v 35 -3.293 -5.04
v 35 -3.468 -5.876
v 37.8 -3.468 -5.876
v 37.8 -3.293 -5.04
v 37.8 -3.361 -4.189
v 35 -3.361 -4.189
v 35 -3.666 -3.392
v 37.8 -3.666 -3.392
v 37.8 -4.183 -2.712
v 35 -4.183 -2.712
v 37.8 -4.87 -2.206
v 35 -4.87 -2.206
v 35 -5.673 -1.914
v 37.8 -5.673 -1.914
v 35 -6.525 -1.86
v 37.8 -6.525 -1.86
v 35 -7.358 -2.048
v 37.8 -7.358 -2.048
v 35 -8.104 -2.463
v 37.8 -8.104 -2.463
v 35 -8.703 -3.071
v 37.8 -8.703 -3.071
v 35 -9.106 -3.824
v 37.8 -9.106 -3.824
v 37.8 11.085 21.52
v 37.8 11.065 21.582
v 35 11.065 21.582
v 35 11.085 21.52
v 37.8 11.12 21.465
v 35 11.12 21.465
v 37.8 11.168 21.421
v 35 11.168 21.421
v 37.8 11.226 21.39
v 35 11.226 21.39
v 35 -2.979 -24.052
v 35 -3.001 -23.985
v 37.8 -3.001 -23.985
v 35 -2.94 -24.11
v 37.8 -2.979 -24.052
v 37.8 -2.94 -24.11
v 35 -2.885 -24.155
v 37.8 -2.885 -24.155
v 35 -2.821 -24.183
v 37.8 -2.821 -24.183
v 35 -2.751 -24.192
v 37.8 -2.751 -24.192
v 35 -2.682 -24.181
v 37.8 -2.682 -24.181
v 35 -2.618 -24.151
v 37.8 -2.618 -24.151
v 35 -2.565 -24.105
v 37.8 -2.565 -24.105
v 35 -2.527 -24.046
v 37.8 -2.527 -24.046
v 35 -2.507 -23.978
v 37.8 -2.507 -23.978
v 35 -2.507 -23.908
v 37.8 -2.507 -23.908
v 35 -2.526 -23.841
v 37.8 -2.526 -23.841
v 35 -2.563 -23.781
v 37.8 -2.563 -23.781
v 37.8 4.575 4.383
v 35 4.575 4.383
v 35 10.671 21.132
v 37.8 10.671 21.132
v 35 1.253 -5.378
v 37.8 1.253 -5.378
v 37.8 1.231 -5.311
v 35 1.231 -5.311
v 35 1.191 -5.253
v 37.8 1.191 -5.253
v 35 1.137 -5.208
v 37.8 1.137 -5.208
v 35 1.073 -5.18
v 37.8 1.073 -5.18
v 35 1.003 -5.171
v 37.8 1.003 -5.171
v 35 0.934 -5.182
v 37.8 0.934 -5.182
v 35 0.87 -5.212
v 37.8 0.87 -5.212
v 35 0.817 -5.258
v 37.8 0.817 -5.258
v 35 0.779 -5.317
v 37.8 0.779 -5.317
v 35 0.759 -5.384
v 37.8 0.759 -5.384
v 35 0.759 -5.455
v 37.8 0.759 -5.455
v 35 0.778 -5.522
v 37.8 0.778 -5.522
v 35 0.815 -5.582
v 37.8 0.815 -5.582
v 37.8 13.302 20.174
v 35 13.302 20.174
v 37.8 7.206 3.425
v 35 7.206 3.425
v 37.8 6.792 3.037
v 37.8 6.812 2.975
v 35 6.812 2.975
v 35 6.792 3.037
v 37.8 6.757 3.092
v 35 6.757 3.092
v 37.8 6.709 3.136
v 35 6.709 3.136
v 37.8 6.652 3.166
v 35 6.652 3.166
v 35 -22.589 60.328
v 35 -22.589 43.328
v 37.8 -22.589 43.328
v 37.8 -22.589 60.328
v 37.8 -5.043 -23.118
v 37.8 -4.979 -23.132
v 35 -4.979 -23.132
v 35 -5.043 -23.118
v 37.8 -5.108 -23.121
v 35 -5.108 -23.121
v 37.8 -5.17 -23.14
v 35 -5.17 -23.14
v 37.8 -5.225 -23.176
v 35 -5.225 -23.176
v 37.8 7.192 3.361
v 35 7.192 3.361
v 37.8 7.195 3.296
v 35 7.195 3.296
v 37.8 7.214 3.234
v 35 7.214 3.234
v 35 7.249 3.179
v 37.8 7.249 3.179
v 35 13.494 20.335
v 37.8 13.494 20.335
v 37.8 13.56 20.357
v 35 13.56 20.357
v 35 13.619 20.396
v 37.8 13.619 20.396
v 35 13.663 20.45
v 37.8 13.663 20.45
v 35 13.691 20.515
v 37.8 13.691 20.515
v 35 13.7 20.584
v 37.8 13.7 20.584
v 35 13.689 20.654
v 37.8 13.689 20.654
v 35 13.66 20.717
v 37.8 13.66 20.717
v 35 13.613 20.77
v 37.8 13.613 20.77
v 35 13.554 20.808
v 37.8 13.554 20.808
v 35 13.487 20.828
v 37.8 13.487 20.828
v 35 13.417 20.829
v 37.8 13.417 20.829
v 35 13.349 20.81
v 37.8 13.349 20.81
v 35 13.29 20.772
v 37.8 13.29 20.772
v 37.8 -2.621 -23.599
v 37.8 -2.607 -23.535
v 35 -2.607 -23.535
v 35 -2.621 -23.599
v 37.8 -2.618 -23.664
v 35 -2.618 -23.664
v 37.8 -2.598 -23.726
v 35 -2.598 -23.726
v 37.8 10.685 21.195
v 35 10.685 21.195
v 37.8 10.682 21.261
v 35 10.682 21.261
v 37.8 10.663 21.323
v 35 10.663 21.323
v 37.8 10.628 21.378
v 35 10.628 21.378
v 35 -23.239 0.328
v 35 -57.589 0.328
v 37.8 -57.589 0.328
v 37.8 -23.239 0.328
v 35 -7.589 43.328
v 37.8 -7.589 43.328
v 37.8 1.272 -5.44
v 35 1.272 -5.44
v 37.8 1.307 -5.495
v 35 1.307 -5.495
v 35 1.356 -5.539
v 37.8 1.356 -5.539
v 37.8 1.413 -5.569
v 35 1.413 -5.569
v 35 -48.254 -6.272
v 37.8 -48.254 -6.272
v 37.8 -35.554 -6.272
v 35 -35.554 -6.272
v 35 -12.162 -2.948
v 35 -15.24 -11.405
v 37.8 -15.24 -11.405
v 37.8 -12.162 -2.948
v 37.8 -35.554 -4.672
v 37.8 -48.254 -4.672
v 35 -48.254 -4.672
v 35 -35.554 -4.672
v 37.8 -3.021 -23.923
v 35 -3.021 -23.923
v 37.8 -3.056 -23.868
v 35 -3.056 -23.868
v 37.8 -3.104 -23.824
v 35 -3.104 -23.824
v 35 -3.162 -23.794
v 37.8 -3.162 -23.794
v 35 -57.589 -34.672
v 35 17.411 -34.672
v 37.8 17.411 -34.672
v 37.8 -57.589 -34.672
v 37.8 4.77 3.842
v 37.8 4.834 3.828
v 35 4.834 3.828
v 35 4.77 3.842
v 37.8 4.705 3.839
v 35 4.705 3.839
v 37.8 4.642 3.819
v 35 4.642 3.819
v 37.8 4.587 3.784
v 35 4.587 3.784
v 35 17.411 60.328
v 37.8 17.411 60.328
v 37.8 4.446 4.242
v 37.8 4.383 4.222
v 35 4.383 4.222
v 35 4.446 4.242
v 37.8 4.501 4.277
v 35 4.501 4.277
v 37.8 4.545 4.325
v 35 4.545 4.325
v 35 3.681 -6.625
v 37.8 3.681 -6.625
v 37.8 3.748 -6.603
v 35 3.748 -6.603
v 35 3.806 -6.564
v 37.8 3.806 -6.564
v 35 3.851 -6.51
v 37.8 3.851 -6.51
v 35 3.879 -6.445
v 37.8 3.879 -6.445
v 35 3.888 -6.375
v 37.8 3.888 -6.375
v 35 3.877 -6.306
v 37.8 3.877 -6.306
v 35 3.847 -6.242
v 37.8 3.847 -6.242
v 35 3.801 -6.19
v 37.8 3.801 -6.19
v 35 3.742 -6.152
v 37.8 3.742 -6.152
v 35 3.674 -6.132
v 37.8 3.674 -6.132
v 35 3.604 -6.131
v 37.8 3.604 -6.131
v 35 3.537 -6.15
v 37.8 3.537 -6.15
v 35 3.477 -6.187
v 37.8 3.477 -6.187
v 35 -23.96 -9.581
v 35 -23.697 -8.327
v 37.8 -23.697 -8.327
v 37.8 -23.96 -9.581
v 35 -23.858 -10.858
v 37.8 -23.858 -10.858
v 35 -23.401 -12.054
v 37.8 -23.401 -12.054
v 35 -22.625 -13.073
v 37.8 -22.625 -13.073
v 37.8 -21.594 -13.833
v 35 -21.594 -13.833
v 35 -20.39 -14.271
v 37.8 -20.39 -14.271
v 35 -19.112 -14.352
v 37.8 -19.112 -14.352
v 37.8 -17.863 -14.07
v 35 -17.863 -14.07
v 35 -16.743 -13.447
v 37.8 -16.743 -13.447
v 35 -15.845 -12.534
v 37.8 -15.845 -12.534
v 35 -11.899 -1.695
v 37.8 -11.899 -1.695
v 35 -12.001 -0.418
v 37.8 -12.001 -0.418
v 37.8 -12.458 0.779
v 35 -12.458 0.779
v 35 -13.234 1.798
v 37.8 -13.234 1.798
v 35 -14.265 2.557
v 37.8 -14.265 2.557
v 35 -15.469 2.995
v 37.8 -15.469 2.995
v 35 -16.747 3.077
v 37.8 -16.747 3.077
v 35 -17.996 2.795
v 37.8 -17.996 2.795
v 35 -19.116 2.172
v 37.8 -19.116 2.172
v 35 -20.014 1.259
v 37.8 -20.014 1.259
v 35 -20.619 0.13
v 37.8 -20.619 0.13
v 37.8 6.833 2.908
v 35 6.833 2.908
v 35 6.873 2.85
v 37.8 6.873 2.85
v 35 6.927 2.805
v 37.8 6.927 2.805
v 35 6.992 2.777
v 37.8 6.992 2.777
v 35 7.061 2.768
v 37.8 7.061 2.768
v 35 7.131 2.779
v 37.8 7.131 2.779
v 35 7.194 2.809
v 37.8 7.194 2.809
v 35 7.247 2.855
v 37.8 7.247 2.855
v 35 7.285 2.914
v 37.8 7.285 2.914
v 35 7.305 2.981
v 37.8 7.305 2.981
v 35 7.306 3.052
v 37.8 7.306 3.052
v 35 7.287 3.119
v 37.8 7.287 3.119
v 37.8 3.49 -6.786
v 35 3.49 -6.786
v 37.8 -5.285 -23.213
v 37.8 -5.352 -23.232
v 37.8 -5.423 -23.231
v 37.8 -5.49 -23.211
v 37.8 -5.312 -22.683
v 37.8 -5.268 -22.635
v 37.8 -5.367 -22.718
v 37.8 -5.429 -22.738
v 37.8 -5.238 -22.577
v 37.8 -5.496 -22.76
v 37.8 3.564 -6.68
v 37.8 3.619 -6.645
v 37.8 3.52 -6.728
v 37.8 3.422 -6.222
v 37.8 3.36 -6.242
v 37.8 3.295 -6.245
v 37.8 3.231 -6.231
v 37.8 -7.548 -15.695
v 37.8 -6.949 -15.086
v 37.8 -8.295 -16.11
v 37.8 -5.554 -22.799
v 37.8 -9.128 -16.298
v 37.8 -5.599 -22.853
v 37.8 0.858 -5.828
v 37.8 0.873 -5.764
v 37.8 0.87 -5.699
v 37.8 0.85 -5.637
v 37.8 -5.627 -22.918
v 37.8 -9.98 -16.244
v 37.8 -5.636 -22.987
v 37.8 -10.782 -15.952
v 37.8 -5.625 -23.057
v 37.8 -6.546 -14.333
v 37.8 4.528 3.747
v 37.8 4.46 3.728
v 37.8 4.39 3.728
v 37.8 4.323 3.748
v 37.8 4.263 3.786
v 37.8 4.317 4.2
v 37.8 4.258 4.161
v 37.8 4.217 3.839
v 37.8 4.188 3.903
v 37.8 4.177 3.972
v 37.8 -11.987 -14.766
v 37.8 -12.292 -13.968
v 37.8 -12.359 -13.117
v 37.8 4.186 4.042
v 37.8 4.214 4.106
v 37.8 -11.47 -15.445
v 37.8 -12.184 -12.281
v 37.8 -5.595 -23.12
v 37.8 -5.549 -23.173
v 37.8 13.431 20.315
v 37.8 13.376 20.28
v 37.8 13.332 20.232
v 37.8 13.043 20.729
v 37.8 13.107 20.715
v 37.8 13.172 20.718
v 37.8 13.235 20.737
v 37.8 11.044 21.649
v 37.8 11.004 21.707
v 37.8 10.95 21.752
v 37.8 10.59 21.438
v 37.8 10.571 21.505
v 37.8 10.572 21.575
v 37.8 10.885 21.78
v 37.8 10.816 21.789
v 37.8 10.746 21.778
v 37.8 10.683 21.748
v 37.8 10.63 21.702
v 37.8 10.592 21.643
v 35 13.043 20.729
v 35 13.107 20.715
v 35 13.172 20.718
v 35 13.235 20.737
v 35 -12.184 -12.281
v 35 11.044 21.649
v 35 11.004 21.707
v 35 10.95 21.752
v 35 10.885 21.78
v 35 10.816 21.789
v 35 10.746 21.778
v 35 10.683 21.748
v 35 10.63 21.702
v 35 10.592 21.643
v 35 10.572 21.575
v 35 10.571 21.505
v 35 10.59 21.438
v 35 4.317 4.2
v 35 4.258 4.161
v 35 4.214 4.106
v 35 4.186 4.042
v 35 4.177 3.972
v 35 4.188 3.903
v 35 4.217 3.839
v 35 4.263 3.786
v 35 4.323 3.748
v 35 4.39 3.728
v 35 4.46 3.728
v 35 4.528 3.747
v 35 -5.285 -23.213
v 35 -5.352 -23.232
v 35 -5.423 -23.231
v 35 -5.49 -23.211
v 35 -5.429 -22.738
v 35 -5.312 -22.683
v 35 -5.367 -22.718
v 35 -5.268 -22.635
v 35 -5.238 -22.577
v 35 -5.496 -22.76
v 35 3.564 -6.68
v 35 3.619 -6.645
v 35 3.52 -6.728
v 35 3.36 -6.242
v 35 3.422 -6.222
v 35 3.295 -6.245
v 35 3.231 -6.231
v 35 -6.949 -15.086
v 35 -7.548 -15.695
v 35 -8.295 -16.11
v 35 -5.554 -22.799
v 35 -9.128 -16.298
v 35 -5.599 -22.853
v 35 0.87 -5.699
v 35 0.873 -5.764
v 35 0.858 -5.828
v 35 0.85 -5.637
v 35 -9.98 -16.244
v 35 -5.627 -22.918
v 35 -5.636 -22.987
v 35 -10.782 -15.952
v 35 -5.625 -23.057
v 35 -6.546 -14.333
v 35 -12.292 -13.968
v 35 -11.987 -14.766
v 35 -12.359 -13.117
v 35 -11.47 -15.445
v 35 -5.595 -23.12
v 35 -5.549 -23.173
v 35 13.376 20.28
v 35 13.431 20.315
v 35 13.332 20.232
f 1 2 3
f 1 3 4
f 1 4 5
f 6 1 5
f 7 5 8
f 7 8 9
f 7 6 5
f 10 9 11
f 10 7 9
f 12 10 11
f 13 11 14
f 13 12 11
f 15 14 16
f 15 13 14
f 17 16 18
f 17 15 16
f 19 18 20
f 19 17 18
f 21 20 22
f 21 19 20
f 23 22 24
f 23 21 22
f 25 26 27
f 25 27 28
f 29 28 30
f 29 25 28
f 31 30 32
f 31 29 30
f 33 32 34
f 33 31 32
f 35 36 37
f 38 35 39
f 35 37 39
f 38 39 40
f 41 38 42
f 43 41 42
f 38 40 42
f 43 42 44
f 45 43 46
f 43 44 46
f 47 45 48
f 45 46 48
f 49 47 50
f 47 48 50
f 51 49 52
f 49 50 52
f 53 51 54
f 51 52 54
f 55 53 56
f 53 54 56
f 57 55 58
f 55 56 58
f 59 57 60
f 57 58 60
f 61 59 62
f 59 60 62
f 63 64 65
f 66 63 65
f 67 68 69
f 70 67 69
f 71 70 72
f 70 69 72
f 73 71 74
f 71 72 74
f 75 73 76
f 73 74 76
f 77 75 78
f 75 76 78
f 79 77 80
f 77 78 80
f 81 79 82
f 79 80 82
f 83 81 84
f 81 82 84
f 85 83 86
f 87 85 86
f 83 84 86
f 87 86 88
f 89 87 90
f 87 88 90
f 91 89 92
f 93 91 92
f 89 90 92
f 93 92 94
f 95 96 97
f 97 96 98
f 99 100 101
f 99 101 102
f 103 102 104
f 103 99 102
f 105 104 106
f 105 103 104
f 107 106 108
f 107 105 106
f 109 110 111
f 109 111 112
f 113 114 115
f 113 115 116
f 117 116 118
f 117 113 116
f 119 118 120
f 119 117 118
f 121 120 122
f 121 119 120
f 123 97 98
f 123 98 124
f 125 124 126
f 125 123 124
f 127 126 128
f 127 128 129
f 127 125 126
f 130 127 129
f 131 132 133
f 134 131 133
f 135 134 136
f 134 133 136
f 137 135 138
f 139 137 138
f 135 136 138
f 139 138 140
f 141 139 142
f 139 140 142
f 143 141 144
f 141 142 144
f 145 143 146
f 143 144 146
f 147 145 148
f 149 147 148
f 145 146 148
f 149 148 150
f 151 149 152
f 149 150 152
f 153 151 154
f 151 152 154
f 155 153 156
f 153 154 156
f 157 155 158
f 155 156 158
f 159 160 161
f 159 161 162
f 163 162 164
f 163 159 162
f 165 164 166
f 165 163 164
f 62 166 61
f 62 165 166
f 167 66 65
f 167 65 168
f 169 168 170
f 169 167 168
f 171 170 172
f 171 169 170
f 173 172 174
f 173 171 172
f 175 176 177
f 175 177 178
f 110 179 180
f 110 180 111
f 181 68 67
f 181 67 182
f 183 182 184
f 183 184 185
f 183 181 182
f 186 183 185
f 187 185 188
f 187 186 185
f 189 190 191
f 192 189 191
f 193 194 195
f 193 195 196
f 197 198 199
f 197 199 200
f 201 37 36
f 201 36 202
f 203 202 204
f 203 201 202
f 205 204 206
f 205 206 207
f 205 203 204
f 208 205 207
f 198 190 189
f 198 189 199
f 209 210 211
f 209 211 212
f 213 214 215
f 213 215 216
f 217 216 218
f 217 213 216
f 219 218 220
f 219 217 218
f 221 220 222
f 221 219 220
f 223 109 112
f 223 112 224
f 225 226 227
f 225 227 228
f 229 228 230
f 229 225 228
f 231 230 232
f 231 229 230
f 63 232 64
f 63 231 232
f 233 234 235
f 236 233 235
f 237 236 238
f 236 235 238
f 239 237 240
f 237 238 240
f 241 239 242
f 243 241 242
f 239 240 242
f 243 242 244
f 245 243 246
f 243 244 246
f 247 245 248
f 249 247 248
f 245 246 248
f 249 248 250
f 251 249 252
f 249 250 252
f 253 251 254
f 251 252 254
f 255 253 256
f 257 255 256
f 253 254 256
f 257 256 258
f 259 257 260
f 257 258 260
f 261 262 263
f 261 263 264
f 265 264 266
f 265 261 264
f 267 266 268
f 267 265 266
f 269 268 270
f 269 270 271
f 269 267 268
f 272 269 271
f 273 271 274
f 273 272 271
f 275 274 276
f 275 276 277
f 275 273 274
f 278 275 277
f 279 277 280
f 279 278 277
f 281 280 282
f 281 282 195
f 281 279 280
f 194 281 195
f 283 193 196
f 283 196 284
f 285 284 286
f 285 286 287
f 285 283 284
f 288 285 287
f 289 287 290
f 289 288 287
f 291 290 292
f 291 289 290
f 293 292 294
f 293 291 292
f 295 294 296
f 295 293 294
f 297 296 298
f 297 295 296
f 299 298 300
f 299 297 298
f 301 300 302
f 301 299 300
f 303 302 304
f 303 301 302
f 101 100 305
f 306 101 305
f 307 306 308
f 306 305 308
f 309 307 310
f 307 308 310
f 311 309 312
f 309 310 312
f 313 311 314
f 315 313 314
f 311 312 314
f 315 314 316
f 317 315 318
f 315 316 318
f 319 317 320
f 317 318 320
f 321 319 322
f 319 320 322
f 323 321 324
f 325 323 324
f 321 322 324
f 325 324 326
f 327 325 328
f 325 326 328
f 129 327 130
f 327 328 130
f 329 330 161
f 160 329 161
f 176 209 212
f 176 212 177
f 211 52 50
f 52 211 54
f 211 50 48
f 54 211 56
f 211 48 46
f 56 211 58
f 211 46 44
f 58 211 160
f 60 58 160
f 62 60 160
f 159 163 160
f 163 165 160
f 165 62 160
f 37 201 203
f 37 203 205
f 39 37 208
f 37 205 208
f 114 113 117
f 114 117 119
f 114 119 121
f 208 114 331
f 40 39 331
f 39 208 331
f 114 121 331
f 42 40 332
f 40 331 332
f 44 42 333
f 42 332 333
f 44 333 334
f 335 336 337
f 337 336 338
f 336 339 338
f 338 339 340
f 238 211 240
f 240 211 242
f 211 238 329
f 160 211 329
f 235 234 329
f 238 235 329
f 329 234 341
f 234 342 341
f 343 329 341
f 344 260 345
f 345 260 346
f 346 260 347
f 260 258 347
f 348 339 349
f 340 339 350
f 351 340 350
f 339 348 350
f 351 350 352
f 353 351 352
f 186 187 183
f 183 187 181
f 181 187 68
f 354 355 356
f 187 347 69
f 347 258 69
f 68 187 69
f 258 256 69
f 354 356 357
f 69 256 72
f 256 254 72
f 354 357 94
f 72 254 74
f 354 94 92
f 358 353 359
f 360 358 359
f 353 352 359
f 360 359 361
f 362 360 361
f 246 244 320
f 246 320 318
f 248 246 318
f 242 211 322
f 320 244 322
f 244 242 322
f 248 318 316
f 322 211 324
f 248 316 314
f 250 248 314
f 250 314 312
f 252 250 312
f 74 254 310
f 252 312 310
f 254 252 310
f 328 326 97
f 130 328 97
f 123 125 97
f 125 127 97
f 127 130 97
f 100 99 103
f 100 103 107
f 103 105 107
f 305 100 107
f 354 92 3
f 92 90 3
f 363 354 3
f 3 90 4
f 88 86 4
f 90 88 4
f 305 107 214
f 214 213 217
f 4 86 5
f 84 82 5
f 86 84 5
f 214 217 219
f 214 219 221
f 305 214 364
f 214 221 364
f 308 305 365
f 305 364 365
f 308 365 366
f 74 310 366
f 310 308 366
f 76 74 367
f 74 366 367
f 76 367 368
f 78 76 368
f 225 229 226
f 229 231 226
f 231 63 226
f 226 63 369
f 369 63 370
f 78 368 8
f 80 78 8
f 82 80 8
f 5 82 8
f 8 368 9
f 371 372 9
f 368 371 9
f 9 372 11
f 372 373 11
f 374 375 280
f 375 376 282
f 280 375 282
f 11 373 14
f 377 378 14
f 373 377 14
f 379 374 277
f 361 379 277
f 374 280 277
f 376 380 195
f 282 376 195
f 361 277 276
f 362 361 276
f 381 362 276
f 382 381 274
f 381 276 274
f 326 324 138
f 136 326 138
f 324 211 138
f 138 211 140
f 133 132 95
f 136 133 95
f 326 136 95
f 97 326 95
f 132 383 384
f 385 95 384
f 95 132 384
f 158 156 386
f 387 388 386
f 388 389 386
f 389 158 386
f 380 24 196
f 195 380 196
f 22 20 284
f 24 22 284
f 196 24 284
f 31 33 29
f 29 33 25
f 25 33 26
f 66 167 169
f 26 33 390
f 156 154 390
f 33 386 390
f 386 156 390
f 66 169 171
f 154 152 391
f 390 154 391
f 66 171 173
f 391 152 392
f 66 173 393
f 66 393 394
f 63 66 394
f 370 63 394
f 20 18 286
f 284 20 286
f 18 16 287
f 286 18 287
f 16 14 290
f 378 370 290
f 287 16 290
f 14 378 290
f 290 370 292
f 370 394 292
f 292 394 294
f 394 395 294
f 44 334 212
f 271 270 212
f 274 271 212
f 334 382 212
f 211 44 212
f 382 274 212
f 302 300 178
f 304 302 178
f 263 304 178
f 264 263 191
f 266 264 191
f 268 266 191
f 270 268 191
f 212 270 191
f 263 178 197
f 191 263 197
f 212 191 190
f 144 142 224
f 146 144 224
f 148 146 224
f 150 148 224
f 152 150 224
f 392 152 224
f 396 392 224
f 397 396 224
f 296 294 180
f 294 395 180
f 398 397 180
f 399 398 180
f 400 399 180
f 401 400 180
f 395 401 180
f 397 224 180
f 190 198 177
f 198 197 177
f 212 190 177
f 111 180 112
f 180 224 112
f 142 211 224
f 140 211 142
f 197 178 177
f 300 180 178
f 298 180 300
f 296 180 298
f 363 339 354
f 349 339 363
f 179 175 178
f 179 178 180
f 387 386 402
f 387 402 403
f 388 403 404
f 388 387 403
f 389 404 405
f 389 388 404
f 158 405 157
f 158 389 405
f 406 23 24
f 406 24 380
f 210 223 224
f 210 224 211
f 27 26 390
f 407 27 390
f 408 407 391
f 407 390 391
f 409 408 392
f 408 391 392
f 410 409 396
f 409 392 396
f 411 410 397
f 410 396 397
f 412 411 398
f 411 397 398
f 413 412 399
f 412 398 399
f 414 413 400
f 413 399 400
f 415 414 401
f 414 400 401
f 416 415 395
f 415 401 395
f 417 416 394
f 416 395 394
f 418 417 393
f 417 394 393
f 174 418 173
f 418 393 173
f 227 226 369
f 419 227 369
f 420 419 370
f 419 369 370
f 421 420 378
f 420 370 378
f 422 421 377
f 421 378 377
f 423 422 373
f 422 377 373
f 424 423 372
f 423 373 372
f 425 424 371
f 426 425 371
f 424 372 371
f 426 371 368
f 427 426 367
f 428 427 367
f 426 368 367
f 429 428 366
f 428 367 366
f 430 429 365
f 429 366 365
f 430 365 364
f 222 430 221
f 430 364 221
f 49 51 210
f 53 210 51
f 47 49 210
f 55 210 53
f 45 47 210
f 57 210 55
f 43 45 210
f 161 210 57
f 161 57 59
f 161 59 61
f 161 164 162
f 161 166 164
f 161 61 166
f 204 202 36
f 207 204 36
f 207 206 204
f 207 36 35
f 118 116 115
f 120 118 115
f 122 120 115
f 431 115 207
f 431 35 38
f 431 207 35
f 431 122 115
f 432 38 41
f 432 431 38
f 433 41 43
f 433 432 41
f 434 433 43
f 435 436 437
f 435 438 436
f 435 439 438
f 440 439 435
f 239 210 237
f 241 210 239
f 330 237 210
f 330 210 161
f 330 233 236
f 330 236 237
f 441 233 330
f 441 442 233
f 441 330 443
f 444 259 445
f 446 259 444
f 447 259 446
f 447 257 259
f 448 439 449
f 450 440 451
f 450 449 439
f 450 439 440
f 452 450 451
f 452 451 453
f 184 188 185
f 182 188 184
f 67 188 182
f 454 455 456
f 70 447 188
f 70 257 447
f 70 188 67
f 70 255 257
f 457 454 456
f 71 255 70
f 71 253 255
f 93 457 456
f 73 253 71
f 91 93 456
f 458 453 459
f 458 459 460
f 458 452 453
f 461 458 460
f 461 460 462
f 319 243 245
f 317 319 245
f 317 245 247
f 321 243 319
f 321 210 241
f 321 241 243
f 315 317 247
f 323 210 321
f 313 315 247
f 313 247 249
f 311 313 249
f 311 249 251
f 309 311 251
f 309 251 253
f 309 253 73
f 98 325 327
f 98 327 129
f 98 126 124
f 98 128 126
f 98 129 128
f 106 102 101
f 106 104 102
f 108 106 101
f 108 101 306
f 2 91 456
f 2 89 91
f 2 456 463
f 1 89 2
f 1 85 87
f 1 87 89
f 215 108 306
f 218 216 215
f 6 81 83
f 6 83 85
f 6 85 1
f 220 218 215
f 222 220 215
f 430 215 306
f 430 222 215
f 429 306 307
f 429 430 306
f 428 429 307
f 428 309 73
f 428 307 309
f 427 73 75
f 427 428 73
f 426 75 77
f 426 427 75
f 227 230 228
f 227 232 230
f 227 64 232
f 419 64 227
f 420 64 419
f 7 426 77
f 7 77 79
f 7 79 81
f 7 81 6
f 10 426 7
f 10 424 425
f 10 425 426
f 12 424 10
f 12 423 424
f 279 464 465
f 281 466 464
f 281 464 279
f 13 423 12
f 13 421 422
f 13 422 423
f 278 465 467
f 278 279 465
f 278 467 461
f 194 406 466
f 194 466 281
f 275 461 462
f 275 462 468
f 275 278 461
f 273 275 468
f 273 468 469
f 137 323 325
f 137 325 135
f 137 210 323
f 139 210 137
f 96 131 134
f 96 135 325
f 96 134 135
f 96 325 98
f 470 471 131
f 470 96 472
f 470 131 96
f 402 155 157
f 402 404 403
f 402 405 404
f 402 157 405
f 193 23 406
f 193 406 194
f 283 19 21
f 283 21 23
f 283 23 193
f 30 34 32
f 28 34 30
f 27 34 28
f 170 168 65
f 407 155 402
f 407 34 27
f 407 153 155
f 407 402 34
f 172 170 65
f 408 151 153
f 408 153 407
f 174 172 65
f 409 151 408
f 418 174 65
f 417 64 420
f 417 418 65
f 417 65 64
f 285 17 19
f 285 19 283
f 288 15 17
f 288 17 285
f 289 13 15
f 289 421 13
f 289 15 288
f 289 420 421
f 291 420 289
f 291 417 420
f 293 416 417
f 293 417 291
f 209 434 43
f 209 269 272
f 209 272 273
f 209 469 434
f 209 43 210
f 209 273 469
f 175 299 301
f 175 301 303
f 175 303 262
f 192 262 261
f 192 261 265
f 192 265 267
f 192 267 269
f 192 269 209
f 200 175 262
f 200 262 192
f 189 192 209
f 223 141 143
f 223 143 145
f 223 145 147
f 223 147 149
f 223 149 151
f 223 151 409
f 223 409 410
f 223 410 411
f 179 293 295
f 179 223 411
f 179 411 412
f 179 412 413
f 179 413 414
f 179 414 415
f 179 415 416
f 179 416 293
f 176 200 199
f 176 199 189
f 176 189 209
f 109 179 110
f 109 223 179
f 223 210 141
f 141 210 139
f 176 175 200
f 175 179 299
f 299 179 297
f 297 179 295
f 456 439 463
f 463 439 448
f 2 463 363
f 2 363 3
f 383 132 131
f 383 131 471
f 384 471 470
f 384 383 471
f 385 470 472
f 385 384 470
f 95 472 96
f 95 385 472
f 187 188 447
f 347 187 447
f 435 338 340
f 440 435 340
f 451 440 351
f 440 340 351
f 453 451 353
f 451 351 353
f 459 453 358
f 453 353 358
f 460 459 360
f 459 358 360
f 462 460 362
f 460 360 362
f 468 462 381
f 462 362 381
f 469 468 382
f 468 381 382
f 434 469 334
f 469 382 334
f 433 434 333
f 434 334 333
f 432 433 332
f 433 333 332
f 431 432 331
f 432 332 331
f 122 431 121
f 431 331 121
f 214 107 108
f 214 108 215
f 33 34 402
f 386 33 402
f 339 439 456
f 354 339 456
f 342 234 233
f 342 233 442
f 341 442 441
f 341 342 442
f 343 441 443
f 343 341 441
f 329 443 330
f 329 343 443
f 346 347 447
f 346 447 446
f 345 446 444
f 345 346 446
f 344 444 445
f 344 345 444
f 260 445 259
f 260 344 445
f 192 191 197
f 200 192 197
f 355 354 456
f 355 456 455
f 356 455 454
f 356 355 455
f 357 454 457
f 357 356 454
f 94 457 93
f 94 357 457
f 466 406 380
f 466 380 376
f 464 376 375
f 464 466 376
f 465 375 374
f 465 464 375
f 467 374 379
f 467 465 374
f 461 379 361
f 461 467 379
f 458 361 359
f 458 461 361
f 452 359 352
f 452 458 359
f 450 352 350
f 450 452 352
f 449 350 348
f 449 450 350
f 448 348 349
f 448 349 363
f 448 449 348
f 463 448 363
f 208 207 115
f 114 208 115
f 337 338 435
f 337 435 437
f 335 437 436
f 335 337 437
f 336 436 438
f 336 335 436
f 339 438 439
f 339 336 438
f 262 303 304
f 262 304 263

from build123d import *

# Parameters (mm, degrees)
PAD001_DEPTH    = 2.8
POCKET005_DEPTH = 2.801
SKETCH021_W     = 12.7
SKETCH021_H     = 1.6
POCKET010_DEPTH = 2.801


with BuildPart() as part:
    # Sketch001 (on Face18 of ShapeBinder) → Pad001 (new body)
    with BuildSketch(Plane.YZ.offset(35)):
        Polygon((-22.588718, 60.327675), (17.411282, 60.327675), (17.411282, -34.672325), (-57.588718, -34.672325), (-57.588718, 0.327675), (-23.239438, 0.327675), (-7.588718, 43.327675), (-22.588718, 43.327675), align=None)
        with BuildLine():
            ThreePointArc((-12.161797, -2.94822), (-14.851323, 2.819487), (-20.61903, 0.129961))
            Line((-20.61903, 0.129961), (-23.697212, -8.327272))
            ThreePointArc((-23.697212, -8.327272), (-21.007685, -14.09498), (-15.239978, -11.405454))
            Line((-15.239978, -11.405454), (-12.161797, -2.94822))
        make_face(mode=Mode.SUBTRACT)
        with BuildLine():
            ThreePointArc((-3.468033, -5.876244), (-5.261051, -2.031105), (-9.106189, -3.824123))
            Line((-9.106189, -3.824123), (-12.18437, -12.281356))
            ThreePointArc((-12.18437, -12.281356), (-10.391353, -16.126495), (-6.546214, -14.333477))
            Line((-6.546214, -14.333477), (-3.468033, -5.876244))
        make_face(mode=Mode.SUBTRACT)
        Polygon((10.819102, 21.538585), (13.450241, 20.580929), (7.057884, 3.018073), (4.426745, 3.97573), align=None, mode=Mode.SUBTRACT)
        Polygon((1.006544, -5.421196), (3.637683, -6.378853), (-2.754673, -23.941708), (-5.385813, -22.984051), align=None, mode=Mode.SUBTRACT)
    extrude(amount=PAD001_DEPTH)

    # Sketch013 (on Face26 of Pad001) → Pocket005 (cut, through all)
    with BuildSketch(Plane.YZ.offset(37.8)):
        with BuildLine():
            ThreePointArc((1.252746, -5.377784), (0.900889, -5.194619), (0.815033, -5.581893))
            ThreePointArc((0.858445, -5.828095), (0.869723, -5.699178), (0.815033, -5.581893))
            Line((0.858445, -5.828095), (1.413442, -5.569295))
            ThreePointArc((1.252746, -5.377784), (1.307436, -5.495069), (1.413442, -5.569295))
        make_face()
        with BuildLine():
            ThreePointArc((3.681095, -6.625055), (3.86426, -6.273198), (3.476986, -6.187342))
            ThreePointArc((3.230784, -6.230754), (3.359701, -6.242032), (3.476986, -6.187342))
            Line((3.489584, -6.785752), (3.230784, -6.230754))
            ThreePointArc((3.681095, -6.625055), (3.56381, -6.679746), (3.489584, -6.785752))
        make_face()
        with BuildLine():
            ThreePointArc((-5.429225, -22.737849), (-5.61239, -23.089706), (-5.225116, -23.175563))
            ThreePointArc((-4.978914, -23.13215), (-5.107831, -23.120872), (-5.225116, -23.175563))
            Line((-5.237714, -22.577153), (-4.978914, -23.13215))
            ThreePointArc((-5.429225, -22.737849), (-5.31194, -22.683159), (-5.237714, -22.577153))
        make_face()
        with BuildLine():
            ThreePointArc((-3.000875, -23.98512), (-2.649019, -24.168285), (-2.563162, -23.781011))
            ThreePointArc((-2.606574, -23.534809), (-2.617853, -23.663726), (-2.563162, -23.781011))
            Line((-2.606574, -23.534809), (-3.161572, -23.793609))
            ThreePointArc((-3.000875, -23.98512), (-3.055566, -23.867835), (-3.161572, -23.793609))
        make_face()
        with BuildLine():
            ThreePointArc((11.065304, 21.581997), (10.713447, 21.765162), (10.62759, 21.377888))
            ThreePointArc((10.671003, 21.131686), (10.682281, 21.260603), (10.62759, 21.377888))
            Line((10.671003, 21.131686), (11.226, 21.390486))
            ThreePointArc((11.065304, 21.581997), (11.119994, 21.464712), (11.226, 21.390486))
        make_face()
        with BuildLine():
            ThreePointArc((13.493653, 20.334727), (13.676818, 20.686583), (13.289544, 20.77244))
            ThreePointArc((13.043342, 20.729028), (13.172259, 20.717749), (13.289544, 20.77244))
            Line((13.302142, 20.17403), (13.043342, 20.729028))
            ThreePointArc((13.493653, 20.334727), (13.376368, 20.280036), (13.302142, 20.17403))
        make_face()
        with BuildLine():
            ThreePointArc((4.383333, 4.221932), (4.200168, 3.870075), (4.587442, 3.784219))
            ThreePointArc((4.833644, 3.827631), (4.704727, 3.83891), (4.587442, 3.784219))
            Line((4.574844, 4.382629), (4.833644, 3.827631))
            ThreePointArc((4.383333, 4.221932), (4.500618, 4.276623), (4.574844, 4.382629))
        make_face()
        with BuildLine():
            ThreePointArc((6.811682, 2.974661), (7.163539, 2.791497), (7.249396, 3.17877))
            ThreePointArc((7.205983, 3.424972), (7.194705, 3.296055), (7.249396, 3.17877))
            Line((7.205983, 3.424972), (6.650986, 3.166173))
            ThreePointArc((6.811682, 2.974661), (6.756992, 3.091946), (6.650986, 3.166173))
        make_face()
    extrude(amount=-POCKET005_DEPTH, mode=Mode.SUBTRACT)

    # Sketch021 (on Face5 of Pocket005) → Pocket010 (cut, through all)
    with BuildSketch(Plane.YZ.offset(37.8)):
        with Locations((-41.903927, -5.472325)):
            Rectangle(SKETCH021_W, SKETCH021_H)
    extrude(amount=-POCKET010_DEPTH, mode=Mode.SUBTRACT)


solid = part.part
